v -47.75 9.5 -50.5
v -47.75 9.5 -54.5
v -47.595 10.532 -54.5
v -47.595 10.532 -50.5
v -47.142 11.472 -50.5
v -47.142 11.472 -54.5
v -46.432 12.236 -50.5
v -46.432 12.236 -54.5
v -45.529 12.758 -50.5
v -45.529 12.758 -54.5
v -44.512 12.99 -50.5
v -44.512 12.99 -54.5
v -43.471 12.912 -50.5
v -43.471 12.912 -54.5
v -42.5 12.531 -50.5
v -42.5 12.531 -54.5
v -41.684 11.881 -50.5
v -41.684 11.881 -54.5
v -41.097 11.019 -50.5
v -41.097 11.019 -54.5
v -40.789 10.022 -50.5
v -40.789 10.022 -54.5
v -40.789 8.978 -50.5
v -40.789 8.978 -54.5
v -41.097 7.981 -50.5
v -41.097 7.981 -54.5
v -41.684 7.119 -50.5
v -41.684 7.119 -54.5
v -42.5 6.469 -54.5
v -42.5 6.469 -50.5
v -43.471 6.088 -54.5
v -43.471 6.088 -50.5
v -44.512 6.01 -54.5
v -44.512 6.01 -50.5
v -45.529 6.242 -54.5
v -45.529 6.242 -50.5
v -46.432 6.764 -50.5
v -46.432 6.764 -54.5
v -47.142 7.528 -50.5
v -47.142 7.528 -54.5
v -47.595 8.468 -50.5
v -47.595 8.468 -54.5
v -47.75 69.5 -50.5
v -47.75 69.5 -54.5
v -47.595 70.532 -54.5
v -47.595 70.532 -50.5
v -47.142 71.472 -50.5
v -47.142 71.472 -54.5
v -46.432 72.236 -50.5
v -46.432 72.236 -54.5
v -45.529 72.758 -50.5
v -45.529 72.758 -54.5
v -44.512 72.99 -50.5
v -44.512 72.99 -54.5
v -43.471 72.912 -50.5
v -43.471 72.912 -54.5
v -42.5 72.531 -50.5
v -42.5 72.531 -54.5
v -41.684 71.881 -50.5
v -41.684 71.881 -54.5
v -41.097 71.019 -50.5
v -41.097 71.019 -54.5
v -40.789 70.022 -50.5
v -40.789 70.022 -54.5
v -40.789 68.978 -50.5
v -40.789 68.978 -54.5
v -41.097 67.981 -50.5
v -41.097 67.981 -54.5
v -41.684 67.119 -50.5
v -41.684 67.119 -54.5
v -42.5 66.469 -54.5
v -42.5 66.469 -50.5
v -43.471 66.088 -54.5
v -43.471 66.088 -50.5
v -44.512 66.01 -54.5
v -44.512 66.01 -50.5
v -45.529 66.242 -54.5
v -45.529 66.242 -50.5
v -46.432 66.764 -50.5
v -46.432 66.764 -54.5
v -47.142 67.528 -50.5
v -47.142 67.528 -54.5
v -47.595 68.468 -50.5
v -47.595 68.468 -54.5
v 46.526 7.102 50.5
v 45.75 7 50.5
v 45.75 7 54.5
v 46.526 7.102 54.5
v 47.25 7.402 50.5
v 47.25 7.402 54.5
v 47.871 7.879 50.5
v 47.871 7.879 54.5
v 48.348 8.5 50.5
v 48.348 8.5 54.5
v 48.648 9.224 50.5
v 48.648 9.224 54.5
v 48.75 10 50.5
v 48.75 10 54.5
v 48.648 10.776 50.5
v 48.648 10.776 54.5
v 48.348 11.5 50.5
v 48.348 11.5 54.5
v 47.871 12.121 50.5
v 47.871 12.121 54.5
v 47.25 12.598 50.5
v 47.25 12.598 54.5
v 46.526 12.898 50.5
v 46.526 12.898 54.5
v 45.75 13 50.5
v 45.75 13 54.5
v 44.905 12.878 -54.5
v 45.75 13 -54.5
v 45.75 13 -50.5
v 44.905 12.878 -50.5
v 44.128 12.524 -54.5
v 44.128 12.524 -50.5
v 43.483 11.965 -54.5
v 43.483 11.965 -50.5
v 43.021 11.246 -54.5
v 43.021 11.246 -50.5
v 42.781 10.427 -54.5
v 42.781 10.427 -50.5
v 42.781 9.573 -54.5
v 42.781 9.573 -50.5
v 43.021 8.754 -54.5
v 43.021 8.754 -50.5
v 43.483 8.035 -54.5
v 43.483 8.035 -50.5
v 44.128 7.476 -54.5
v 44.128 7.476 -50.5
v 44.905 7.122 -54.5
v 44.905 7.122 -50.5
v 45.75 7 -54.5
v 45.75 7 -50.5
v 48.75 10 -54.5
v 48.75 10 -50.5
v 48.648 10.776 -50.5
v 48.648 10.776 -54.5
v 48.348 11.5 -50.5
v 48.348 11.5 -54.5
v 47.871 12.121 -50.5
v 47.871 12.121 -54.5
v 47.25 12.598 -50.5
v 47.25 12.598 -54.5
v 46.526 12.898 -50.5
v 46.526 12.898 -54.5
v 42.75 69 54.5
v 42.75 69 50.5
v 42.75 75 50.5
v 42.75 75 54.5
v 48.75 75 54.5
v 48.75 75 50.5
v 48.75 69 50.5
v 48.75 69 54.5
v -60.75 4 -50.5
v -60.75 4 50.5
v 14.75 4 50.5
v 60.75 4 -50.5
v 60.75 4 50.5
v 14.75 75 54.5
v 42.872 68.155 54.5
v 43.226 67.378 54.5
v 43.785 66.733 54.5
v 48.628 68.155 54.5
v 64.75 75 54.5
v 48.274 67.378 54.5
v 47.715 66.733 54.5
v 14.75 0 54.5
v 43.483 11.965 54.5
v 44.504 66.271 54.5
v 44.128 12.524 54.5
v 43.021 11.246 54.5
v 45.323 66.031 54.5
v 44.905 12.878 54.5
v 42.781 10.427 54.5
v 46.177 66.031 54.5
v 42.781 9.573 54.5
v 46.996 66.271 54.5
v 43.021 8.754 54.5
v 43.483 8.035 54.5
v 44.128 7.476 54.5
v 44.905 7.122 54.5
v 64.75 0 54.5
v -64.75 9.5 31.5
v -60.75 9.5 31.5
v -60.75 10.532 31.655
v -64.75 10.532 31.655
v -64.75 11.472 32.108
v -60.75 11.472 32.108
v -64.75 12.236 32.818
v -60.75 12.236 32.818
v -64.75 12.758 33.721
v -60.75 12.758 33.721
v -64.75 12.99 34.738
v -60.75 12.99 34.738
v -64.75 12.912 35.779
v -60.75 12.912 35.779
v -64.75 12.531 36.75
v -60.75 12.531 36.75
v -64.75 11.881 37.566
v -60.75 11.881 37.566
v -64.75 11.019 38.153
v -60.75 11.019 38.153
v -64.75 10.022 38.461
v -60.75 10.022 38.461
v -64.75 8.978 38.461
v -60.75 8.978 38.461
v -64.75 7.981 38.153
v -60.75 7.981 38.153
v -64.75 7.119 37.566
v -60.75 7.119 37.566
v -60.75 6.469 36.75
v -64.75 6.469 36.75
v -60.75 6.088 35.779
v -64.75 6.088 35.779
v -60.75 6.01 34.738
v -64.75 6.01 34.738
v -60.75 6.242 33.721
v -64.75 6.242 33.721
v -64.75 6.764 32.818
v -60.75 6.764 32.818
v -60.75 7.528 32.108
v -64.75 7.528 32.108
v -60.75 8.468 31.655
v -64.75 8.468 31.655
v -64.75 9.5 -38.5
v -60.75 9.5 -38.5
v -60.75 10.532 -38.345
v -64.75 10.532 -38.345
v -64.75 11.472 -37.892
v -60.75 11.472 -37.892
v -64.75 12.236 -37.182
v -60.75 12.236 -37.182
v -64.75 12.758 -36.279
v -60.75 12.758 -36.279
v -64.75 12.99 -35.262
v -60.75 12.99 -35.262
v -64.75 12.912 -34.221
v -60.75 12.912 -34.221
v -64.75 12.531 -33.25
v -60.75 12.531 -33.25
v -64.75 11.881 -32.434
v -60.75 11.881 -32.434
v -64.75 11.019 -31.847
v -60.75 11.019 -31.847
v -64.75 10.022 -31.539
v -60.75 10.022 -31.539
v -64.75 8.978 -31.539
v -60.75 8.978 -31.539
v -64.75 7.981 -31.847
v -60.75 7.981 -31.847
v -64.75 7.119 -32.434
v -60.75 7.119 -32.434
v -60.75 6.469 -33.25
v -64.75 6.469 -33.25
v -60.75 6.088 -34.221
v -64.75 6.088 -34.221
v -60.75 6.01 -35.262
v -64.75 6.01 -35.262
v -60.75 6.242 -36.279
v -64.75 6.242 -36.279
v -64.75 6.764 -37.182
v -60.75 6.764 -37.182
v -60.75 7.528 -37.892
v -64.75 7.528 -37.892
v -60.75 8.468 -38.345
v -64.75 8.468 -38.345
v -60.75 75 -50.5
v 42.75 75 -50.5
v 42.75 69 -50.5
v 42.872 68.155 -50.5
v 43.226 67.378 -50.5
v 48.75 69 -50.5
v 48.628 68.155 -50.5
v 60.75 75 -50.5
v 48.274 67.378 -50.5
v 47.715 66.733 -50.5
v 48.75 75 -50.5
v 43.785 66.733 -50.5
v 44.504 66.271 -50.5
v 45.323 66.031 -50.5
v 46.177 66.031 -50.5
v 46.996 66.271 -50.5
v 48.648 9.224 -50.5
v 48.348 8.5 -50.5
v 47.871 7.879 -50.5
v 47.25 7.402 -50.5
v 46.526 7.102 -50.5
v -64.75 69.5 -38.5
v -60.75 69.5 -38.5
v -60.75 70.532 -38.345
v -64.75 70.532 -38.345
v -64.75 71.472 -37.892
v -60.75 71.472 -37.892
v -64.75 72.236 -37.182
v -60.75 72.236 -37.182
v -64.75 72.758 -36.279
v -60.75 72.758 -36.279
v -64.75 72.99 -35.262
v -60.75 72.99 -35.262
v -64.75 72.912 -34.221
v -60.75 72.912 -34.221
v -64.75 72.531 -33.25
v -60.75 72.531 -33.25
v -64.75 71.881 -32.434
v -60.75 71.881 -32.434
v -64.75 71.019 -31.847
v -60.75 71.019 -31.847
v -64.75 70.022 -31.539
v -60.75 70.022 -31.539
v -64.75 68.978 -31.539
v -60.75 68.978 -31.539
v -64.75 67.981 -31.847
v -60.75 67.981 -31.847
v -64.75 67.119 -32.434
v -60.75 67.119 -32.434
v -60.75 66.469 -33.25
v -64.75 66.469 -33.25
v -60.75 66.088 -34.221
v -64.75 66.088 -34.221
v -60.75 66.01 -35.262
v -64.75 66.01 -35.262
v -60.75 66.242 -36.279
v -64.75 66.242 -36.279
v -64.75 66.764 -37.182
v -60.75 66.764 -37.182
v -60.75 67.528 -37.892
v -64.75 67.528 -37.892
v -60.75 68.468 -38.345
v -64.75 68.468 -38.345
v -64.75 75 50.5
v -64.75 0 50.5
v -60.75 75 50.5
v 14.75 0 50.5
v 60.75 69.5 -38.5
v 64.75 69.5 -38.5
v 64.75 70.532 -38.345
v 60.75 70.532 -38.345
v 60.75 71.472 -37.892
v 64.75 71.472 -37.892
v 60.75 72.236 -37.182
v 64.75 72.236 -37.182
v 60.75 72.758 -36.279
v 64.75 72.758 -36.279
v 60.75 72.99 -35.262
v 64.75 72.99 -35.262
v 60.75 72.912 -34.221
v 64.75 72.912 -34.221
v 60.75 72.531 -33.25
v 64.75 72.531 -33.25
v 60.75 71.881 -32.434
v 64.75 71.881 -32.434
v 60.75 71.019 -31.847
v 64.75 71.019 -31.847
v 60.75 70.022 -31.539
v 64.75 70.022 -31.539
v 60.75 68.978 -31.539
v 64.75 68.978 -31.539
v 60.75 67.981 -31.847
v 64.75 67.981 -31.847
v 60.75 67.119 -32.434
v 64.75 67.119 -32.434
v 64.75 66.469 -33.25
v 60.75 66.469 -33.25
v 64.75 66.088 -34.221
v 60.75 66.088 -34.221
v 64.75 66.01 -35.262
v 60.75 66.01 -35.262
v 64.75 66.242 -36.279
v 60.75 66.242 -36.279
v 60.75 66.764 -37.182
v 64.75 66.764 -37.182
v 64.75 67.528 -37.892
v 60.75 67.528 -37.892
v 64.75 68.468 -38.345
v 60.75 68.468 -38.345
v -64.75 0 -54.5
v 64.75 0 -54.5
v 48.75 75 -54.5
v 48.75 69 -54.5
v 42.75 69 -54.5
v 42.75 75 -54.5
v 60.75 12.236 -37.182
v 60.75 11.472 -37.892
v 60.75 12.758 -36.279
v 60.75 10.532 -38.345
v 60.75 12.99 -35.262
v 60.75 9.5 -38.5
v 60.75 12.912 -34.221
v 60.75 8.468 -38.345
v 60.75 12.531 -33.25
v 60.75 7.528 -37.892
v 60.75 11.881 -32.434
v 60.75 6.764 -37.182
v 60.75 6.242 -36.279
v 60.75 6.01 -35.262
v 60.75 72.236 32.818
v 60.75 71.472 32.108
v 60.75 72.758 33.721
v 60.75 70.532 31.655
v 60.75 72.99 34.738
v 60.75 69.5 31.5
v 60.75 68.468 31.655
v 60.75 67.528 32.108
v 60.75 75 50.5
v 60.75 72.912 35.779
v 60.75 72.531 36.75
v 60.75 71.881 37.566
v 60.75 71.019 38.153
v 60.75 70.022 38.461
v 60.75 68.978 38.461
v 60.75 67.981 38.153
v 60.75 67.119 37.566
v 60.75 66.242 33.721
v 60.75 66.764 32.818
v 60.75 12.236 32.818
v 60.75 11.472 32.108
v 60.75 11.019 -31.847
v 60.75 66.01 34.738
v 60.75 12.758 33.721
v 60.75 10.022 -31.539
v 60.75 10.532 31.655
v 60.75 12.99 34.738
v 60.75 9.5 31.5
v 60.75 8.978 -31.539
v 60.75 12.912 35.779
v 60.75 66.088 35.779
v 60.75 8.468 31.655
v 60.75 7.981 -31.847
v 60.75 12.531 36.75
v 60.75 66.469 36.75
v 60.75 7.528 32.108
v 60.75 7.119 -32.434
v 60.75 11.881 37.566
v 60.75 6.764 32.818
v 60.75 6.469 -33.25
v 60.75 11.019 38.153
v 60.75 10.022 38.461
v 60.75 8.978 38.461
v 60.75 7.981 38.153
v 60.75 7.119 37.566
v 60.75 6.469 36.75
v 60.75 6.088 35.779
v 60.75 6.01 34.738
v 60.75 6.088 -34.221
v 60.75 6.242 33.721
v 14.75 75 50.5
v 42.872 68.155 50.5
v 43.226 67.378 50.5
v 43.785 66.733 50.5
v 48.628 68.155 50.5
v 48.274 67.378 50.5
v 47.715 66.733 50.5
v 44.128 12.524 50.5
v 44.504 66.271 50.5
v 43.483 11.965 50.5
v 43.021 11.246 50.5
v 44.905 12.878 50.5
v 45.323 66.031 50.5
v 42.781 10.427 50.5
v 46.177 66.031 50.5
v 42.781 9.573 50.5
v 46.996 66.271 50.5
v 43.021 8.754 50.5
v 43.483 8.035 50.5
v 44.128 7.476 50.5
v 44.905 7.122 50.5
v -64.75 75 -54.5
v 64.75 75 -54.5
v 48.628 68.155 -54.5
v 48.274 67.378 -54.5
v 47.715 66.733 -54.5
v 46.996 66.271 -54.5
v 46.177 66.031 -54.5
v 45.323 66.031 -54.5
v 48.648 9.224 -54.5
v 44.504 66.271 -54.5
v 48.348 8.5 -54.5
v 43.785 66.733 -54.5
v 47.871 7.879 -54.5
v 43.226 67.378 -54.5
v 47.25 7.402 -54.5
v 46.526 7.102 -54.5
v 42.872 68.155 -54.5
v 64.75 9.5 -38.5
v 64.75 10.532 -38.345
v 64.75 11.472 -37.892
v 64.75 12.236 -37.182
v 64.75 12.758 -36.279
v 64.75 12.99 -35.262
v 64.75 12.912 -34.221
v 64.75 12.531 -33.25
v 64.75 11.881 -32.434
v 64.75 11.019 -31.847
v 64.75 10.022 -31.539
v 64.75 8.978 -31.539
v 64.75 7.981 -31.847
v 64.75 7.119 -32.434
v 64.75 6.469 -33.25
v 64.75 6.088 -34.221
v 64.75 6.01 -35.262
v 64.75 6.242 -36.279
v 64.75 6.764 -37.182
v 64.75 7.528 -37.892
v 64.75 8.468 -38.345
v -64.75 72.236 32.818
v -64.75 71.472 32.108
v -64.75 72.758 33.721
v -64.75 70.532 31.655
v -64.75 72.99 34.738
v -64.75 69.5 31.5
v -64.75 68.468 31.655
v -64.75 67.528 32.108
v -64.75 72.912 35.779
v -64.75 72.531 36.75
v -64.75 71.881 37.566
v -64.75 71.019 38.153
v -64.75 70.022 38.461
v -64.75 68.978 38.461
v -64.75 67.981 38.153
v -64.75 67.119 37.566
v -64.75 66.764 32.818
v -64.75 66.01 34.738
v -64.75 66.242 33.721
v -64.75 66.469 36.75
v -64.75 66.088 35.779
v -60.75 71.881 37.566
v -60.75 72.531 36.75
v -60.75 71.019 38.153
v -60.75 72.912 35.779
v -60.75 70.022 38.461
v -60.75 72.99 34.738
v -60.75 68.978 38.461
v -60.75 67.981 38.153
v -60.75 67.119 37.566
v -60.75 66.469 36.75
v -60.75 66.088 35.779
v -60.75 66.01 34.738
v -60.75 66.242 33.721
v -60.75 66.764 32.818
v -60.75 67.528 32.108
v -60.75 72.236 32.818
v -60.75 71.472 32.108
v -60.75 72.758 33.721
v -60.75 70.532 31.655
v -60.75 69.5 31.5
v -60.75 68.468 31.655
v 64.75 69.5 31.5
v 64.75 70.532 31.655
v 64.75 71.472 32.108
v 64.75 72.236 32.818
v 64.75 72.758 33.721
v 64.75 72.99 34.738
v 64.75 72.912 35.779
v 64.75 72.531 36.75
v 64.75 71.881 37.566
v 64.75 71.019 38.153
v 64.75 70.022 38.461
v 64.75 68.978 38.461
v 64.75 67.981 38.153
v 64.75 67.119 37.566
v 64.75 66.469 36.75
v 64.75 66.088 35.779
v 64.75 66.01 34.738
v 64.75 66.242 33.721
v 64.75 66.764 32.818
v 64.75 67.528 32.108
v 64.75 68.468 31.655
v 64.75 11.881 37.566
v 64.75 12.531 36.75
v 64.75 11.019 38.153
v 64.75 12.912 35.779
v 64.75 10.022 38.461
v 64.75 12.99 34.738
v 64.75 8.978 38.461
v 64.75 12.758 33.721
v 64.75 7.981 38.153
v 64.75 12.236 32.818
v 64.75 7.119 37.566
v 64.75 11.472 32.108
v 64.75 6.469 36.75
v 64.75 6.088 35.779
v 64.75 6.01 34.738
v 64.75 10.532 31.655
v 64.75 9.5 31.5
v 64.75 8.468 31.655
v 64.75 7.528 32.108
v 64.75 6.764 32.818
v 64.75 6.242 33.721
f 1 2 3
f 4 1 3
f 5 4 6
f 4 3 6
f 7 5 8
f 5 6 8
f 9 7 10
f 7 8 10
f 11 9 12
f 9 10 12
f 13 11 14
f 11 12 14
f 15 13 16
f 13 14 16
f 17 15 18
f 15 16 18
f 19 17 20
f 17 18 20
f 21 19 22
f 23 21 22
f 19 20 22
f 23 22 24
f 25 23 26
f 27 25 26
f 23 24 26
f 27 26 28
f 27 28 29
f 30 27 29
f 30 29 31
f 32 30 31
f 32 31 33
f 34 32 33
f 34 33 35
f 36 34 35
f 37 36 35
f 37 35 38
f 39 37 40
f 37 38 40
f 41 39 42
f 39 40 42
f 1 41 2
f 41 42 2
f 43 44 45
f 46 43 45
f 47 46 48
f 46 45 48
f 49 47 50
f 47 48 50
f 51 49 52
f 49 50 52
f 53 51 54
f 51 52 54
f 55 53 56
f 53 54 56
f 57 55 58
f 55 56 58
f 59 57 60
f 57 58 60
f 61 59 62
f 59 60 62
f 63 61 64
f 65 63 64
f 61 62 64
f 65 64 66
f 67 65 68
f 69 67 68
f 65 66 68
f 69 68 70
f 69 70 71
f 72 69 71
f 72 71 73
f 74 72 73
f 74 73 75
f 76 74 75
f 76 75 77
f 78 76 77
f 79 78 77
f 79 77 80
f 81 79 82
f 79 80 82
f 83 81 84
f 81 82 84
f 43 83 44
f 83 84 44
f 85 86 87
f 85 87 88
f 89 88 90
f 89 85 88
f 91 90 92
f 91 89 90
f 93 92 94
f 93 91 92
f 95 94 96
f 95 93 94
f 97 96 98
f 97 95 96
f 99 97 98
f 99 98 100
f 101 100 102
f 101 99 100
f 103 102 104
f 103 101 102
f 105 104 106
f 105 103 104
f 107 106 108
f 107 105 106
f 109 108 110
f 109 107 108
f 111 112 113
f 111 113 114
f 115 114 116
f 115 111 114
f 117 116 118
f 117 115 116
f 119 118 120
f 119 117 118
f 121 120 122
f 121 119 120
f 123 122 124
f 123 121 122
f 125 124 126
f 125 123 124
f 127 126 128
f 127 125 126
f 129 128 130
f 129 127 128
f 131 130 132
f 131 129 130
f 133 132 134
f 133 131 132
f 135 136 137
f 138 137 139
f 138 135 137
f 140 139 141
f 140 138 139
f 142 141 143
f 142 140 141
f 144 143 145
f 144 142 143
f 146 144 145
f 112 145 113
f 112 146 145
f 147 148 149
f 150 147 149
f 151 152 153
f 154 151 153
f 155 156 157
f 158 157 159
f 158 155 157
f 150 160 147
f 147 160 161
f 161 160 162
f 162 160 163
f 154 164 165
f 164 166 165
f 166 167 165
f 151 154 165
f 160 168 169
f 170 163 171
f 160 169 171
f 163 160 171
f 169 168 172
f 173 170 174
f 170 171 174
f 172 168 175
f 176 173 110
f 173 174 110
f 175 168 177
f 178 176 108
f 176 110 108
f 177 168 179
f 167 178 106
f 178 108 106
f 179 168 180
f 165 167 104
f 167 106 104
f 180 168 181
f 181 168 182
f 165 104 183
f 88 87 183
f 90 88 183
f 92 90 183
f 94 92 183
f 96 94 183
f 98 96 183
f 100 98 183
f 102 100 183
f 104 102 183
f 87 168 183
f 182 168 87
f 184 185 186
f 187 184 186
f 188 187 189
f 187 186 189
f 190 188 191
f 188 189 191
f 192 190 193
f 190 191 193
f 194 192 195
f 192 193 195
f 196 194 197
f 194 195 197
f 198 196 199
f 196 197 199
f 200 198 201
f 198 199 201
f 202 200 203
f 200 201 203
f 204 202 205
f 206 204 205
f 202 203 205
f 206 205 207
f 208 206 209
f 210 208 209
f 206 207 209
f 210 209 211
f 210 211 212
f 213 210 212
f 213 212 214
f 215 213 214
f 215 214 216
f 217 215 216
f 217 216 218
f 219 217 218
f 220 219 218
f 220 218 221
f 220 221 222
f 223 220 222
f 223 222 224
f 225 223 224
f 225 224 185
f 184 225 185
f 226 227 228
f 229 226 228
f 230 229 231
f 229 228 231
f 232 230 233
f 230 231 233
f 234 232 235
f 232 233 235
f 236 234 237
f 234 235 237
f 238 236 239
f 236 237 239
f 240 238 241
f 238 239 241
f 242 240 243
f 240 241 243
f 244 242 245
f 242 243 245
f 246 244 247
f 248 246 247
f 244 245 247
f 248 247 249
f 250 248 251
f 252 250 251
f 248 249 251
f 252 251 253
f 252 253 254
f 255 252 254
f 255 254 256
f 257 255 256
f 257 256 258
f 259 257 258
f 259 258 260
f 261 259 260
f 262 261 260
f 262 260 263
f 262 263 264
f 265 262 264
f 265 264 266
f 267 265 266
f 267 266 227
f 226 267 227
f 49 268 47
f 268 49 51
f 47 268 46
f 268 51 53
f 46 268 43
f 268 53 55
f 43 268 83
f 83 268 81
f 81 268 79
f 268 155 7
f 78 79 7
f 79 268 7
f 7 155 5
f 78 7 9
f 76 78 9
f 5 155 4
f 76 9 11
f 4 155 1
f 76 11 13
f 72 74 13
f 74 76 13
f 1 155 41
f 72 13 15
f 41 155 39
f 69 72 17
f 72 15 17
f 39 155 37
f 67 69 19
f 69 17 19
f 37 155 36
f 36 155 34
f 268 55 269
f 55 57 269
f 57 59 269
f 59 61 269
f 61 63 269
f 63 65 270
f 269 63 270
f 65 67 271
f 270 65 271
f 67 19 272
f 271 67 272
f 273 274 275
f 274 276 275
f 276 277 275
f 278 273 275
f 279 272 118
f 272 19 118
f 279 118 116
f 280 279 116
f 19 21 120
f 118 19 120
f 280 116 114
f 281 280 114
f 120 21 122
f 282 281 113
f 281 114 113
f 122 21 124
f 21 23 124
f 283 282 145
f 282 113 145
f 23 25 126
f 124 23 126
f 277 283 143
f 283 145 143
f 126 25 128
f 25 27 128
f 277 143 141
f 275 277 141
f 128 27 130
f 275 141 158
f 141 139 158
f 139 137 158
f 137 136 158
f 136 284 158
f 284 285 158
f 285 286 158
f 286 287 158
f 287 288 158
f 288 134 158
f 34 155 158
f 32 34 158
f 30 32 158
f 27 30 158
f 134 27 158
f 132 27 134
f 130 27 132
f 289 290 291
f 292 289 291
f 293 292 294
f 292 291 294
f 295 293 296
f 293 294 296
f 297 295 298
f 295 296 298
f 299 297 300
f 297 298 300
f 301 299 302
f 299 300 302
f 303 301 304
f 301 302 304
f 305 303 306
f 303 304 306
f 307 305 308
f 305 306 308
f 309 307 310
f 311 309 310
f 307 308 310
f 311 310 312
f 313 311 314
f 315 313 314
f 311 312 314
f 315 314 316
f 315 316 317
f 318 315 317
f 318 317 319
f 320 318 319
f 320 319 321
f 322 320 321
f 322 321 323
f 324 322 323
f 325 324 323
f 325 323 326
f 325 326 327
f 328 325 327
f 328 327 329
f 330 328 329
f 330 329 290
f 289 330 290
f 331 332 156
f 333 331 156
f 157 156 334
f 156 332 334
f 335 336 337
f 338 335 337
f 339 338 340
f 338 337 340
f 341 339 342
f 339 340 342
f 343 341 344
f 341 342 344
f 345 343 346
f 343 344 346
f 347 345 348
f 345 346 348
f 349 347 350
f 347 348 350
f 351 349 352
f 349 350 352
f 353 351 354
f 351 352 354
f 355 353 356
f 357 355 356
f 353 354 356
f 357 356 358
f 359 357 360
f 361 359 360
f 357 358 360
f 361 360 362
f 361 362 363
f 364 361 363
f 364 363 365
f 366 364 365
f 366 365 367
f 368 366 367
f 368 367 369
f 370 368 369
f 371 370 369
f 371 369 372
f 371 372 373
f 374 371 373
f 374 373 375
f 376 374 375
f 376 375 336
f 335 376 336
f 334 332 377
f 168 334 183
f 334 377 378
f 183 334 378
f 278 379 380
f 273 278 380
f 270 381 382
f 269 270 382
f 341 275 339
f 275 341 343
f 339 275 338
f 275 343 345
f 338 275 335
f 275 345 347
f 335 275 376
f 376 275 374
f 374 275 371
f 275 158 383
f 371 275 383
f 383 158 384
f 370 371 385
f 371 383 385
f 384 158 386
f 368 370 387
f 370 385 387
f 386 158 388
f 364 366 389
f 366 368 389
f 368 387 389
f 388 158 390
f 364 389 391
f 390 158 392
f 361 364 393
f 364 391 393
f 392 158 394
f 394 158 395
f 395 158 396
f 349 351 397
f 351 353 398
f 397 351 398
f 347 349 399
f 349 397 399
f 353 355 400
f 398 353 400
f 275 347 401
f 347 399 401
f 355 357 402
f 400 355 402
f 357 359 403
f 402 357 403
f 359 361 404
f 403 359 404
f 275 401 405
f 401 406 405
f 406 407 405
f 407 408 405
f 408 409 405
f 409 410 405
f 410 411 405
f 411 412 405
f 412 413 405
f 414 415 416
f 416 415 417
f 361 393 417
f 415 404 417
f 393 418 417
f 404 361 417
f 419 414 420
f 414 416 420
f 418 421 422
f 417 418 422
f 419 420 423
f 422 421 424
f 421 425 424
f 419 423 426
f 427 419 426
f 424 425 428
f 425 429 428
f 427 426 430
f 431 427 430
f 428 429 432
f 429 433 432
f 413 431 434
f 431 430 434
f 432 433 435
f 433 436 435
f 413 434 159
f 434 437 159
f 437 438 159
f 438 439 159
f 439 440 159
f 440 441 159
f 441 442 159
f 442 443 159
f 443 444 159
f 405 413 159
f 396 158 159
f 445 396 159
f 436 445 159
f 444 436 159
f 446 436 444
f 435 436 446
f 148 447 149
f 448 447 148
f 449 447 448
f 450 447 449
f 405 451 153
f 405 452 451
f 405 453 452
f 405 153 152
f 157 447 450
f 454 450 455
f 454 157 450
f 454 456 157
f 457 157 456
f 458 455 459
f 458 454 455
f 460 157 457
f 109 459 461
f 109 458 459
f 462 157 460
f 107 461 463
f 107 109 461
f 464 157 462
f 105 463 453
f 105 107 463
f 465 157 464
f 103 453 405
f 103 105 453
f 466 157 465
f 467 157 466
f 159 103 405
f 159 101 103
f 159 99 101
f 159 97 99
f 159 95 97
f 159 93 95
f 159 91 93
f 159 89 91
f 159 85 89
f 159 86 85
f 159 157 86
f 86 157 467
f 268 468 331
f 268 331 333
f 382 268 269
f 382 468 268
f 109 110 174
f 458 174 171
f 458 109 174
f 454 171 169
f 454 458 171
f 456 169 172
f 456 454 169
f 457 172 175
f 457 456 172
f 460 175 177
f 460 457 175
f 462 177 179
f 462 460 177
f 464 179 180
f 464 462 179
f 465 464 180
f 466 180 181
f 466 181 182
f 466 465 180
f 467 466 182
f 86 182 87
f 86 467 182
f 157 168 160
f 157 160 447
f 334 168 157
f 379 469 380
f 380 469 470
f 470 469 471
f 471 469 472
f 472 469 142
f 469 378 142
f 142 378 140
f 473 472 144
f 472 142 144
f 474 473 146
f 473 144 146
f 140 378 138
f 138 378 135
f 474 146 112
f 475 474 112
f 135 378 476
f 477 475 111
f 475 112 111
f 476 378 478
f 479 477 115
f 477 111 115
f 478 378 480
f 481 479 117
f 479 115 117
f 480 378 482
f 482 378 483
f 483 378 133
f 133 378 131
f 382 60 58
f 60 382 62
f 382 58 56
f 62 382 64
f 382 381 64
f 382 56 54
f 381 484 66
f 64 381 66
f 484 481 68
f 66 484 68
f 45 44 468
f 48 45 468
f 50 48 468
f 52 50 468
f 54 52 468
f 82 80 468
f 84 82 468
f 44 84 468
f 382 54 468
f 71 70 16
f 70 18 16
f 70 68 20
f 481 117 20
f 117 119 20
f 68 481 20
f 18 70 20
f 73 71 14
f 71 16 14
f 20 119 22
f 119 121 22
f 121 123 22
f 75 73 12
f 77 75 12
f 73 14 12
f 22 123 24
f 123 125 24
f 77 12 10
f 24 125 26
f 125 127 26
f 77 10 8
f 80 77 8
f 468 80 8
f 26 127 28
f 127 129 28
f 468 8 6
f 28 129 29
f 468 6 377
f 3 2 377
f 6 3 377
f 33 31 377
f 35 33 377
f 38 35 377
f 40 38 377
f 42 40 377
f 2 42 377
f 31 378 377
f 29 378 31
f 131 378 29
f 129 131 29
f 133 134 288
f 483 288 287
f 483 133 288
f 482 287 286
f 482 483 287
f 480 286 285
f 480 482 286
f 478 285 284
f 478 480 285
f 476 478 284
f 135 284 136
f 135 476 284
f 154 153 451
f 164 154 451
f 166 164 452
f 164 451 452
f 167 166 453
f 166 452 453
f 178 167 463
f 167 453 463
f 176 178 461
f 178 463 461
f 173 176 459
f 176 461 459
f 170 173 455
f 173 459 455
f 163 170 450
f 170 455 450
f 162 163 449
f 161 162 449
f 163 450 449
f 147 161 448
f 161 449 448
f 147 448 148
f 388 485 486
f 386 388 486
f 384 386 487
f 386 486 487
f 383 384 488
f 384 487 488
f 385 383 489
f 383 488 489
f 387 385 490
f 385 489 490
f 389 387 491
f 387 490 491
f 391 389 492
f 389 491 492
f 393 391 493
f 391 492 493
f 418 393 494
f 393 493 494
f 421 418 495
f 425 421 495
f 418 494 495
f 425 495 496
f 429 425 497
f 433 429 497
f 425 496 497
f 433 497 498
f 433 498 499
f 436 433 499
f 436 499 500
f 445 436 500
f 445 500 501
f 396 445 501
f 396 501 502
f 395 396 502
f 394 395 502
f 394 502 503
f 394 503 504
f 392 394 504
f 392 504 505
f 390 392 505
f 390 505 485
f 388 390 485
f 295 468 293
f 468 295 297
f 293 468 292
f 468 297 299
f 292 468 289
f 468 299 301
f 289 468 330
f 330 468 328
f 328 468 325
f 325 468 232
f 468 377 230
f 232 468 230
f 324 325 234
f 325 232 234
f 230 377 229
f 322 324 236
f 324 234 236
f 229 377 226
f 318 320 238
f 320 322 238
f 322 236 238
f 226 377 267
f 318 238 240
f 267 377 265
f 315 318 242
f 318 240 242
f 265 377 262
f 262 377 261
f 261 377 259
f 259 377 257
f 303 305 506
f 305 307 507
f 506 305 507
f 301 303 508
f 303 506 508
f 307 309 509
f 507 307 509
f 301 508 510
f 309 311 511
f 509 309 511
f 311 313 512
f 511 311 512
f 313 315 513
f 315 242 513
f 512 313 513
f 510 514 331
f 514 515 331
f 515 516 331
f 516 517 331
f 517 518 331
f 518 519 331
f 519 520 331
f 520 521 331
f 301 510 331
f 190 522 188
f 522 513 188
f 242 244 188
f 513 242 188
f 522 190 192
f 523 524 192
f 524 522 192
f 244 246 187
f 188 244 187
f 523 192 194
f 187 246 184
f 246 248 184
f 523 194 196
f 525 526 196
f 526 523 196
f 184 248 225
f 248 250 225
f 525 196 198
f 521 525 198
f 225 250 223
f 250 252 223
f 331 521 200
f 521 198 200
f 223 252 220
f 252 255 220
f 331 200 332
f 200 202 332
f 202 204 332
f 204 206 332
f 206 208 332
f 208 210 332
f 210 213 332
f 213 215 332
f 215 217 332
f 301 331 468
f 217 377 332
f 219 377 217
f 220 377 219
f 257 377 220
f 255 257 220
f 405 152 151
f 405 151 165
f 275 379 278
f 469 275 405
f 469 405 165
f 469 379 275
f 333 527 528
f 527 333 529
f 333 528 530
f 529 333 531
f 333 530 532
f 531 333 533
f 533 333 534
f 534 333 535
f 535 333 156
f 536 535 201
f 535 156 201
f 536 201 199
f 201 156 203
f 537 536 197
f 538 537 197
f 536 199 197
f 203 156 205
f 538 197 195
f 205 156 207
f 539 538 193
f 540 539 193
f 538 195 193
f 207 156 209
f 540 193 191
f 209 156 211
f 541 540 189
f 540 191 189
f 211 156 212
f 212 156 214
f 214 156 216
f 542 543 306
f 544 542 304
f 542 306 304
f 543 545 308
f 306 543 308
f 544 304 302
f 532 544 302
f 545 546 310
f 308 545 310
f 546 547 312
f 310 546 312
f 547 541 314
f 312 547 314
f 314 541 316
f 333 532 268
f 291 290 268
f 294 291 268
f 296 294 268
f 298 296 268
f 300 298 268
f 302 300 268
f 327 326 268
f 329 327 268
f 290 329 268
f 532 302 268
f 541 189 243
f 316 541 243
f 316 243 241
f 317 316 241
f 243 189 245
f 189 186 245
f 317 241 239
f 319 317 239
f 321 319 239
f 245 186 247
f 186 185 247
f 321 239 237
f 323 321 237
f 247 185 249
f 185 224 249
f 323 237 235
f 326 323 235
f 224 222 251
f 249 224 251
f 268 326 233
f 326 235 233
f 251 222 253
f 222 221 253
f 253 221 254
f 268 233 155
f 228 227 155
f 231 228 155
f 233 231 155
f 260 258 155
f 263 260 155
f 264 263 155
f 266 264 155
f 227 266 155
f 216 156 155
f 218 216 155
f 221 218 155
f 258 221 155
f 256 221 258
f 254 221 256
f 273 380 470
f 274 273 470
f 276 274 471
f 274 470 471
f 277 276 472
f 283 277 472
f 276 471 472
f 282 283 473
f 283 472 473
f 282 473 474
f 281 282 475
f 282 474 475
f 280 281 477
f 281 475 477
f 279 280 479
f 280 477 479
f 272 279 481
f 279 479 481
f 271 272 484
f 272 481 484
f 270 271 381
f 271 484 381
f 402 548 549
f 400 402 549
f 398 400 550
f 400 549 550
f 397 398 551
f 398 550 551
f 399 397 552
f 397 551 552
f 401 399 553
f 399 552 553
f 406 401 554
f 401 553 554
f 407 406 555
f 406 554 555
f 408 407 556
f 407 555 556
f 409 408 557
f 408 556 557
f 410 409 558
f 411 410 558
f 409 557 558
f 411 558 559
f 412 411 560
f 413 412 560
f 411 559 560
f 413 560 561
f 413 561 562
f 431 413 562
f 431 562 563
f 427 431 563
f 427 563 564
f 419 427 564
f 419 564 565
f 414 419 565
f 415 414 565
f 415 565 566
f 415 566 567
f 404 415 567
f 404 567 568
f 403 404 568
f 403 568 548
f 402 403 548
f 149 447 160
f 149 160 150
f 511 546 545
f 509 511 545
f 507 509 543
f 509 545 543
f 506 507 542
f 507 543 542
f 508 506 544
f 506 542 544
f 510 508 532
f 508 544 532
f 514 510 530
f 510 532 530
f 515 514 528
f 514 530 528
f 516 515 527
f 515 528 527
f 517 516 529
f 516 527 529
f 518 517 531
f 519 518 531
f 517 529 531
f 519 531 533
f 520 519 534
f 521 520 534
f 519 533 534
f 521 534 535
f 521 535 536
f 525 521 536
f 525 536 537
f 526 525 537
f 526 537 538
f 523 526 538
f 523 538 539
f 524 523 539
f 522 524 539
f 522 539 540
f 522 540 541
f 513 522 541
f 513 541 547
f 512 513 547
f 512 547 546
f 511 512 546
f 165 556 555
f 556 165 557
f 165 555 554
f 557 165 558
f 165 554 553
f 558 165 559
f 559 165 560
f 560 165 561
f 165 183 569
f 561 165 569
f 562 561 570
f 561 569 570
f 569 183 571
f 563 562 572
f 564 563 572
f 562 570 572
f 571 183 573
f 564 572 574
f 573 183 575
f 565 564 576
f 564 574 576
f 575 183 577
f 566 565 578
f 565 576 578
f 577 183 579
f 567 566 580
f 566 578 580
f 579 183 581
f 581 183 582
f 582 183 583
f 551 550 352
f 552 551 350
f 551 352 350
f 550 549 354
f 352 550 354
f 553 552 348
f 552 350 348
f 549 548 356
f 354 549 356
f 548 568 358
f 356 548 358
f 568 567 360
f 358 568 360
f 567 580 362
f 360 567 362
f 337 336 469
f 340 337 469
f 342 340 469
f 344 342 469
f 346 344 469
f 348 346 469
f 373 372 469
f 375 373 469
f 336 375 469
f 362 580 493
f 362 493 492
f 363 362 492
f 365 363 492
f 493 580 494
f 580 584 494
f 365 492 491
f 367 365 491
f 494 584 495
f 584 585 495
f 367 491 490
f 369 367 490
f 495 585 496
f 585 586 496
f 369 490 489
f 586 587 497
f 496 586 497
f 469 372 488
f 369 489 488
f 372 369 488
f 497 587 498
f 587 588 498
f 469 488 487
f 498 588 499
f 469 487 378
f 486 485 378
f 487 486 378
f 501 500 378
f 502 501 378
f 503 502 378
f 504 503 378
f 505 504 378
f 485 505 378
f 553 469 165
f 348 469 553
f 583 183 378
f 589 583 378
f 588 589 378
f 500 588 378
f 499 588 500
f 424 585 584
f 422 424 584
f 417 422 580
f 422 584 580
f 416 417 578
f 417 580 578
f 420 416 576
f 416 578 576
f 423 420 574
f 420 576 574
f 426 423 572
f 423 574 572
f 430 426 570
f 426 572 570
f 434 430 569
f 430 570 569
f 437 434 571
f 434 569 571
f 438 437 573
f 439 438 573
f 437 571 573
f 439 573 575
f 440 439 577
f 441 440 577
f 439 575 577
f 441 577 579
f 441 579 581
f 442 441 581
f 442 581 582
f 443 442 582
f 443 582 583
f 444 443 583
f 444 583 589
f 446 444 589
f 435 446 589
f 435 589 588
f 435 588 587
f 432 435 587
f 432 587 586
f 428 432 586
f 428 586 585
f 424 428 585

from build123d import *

# Parameters (mm, degrees)
CROQUIS1_W              = 121.5
CROQUIS1_H              = 101
SALIENTE_EXTRUIR2_DEPTH = 4
SALIENTE_EXTRUIR3_DEPTH = 75
CROQUIS3_W              = 50
CROQUIS3_H              = 4
SALIENTE_EXTRUIR4_DEPTH = 75
CORTAR_EXTRUIR1_REACH   = 161.266
CROQUIS4_R              = 3.5
CROQUIS5_R              = 3.5
CORTAR_EXTRUIR2_DEPTH   = 4
CORTAR_EXTRUIR3_START   = -54.5
CORTAR_EXTRUIR3_DEPTH   = 109


with BuildPart() as part:
    # Croquis1 → Saliente-Extruir2 (new body)
    with BuildSketch(Plane(origin=(0, 0, 0), x_dir=(1, 0, 0), z_dir=(0, 1, 0))):
        Rectangle(CROQUIS1_W, CROQUIS1_H)
    extrude(amount=SALIENTE_EXTRUIR2_DEPTH)

    # Croquis2 → Saliente-Extruir3 (add)
    with BuildSketch(Plane(origin=(0, 0, 0), x_dir=(1, 0, 0), z_dir=(0, 1, 0))):
        Polygon((60.75, -50.5), (64.75, -50.5), (64.75, 54.5), (60.75, 54.5), (-64.75, 54.5), (-64.75, -50.5), (-60.75, -50.5), (-60.75, 50.5), (60.75, 50.5), align=None)
    extrude(amount=SALIENTE_EXTRUIR3_DEPTH)

    # Croquis3 → Saliente-Extruir4 (add)
    with BuildSketch(Plane(origin=(0, 0, 0), x_dir=(1, 0, 0), z_dir=(0, 1, 0))):
        with Locations((39.75, -52.5)):
            Rectangle(CROQUIS3_W, CROQUIS3_H)
    extrude(amount=SALIENTE_EXTRUIR4_DEPTH)

    # Cortar-Extruir1: up to this face of the body (flat: up to its plane)
    cortar_extruir1_end = Plane(part.part.faces().sort_by_distance((-64.75, 37.5, -2))[0])
    # Croquis4 → Cortar-Extruir1 (cut, up to the picked face)
    with BuildSketch(Plane(origin=(64.75, 0, 0), x_dir=(0, 0, -1), z_dir=(1, 0, 0)), mode=Mode.PRIVATE) as cortar_extruir1_sk1:
        with Locations((-35, 69.5)):
            Circle(CROQUIS4_R)
    cortar_extruir1_tool1 = split(extrude(cortar_extruir1_sk1.sketch, amount=-CORTAR_EXTRUIR1_REACH, mode=Mode.PRIVATE), bisect_by=cortar_extruir1_end, keep=Keep.BOTH, mode=Mode.PRIVATE)
    # Croquis4 → Cortar-Extruir1 (cut, up to the picked face)
    with BuildSketch(Plane(origin=(64.75, 0, 0), x_dir=(0, 0, -1), z_dir=(1, 0, 0)), mode=Mode.PRIVATE) as cortar_extruir1_sk2:
        with Locations((35, 9.5)):
            Circle(CROQUIS4_R)
    cortar_extruir1_tool2 = split(extrude(cortar_extruir1_sk2.sketch, amount=-CORTAR_EXTRUIR1_REACH, mode=Mode.PRIVATE), bisect_by=cortar_extruir1_end, keep=Keep.BOTH, mode=Mode.PRIVATE)
    # Croquis4 → Cortar-Extruir1 (cut, up to the picked face)
    with BuildSketch(Plane(origin=(64.75, 0, 0), x_dir=(0, 0, -1), z_dir=(1, 0, 0)), mode=Mode.PRIVATE) as cortar_extruir1_sk3:
        with Locations((-35, 9.5)):
            Circle(CROQUIS4_R)
    cortar_extruir1_tool3 = split(extrude(cortar_extruir1_sk3.sketch, amount=-CORTAR_EXTRUIR1_REACH, mode=Mode.PRIVATE), bisect_by=cortar_extruir1_end, keep=Keep.BOTH, mode=Mode.PRIVATE)
    # Croquis4 → Cortar-Extruir1 (cut, up to the picked face)
    with BuildSketch(Plane(origin=(64.75, 0, 0), x_dir=(0, 0, -1), z_dir=(1, 0, 0)), mode=Mode.PRIVATE) as cortar_extruir1_sk4:
        with Locations((35, 69.5)):
            Circle(CROQUIS4_R)
    cortar_extruir1_tool4 = split(extrude(cortar_extruir1_sk4.sketch, amount=-CORTAR_EXTRUIR1_REACH, mode=Mode.PRIVATE), bisect_by=cortar_extruir1_end, keep=Keep.BOTH, mode=Mode.PRIVATE)
    add(cortar_extruir1_tool1.solids().sort_by(Axis((64.75, 69.5, 35), (-1, 0, 0)))[0], mode=Mode.SUBTRACT)
    add(cortar_extruir1_tool2.solids().sort_by(Axis((64.75, 9.5, -35), (-1, 0, 0)))[0], mode=Mode.SUBTRACT)
    add(cortar_extruir1_tool3.solids().sort_by(Axis((64.75, 9.5, 35), (-1, 0, 0)))[0], mode=Mode.SUBTRACT)
    add(cortar_extruir1_tool4.solids().sort_by(Axis((64.75, 69.5, -35), (-1, 0, 0)))[0], mode=Mode.SUBTRACT)

    # Croquis5 → Cortar-Extruir2 (cut)
    with BuildSketch(Plane(origin=(0, 0, -54.5), x_dir=(-1, 0, 0), z_dir=(0, 0, -1))):
        with Locations((44.25, 69.5)):
            Circle(CROQUIS5_R)
        with Locations((44.25, 9.5)):
            Circle(CROQUIS5_R)
    extrude(amount=-CORTAR_EXTRUIR2_DEPTH, mode=Mode.SUBTRACT)

    # Croquis6 → Cortar-Extruir3 (cut)
    with BuildSketch(Plane.XY.offset(CORTAR_EXTRUIR3_START)):
        with BuildLine():
            Line((42.75, 69), (42.75, 75))
            Line((42.75, 75), (45.75, 75))
            Line((45.75, 75), (48.75, 75))
            Line((48.75, 75), (48.75, 69))
            ThreePointArc((48.75, 69), (45.75, 66), (42.75, 69))
        make_face()
        with BuildLine():
            ThreePointArc((48.75, 10), (47.871320344, 12.121320344), (45.75, 13))
            Line((45.75, 13), (45.75, 7))
            ThreePointArc((45.75, 7), (47.871320344, 7.878679656), (48.75, 10))
        make_face()
        with BuildLine():
            Line((45.75, 7), (45.75, 13))
            ThreePointArc((45.75, 13), (42.75, 10), (45.75, 7))
        make_face()
    extrude(amount=CORTAR_EXTRUIR3_DEPTH, mode=Mode.SUBTRACT)


solid = part.part
